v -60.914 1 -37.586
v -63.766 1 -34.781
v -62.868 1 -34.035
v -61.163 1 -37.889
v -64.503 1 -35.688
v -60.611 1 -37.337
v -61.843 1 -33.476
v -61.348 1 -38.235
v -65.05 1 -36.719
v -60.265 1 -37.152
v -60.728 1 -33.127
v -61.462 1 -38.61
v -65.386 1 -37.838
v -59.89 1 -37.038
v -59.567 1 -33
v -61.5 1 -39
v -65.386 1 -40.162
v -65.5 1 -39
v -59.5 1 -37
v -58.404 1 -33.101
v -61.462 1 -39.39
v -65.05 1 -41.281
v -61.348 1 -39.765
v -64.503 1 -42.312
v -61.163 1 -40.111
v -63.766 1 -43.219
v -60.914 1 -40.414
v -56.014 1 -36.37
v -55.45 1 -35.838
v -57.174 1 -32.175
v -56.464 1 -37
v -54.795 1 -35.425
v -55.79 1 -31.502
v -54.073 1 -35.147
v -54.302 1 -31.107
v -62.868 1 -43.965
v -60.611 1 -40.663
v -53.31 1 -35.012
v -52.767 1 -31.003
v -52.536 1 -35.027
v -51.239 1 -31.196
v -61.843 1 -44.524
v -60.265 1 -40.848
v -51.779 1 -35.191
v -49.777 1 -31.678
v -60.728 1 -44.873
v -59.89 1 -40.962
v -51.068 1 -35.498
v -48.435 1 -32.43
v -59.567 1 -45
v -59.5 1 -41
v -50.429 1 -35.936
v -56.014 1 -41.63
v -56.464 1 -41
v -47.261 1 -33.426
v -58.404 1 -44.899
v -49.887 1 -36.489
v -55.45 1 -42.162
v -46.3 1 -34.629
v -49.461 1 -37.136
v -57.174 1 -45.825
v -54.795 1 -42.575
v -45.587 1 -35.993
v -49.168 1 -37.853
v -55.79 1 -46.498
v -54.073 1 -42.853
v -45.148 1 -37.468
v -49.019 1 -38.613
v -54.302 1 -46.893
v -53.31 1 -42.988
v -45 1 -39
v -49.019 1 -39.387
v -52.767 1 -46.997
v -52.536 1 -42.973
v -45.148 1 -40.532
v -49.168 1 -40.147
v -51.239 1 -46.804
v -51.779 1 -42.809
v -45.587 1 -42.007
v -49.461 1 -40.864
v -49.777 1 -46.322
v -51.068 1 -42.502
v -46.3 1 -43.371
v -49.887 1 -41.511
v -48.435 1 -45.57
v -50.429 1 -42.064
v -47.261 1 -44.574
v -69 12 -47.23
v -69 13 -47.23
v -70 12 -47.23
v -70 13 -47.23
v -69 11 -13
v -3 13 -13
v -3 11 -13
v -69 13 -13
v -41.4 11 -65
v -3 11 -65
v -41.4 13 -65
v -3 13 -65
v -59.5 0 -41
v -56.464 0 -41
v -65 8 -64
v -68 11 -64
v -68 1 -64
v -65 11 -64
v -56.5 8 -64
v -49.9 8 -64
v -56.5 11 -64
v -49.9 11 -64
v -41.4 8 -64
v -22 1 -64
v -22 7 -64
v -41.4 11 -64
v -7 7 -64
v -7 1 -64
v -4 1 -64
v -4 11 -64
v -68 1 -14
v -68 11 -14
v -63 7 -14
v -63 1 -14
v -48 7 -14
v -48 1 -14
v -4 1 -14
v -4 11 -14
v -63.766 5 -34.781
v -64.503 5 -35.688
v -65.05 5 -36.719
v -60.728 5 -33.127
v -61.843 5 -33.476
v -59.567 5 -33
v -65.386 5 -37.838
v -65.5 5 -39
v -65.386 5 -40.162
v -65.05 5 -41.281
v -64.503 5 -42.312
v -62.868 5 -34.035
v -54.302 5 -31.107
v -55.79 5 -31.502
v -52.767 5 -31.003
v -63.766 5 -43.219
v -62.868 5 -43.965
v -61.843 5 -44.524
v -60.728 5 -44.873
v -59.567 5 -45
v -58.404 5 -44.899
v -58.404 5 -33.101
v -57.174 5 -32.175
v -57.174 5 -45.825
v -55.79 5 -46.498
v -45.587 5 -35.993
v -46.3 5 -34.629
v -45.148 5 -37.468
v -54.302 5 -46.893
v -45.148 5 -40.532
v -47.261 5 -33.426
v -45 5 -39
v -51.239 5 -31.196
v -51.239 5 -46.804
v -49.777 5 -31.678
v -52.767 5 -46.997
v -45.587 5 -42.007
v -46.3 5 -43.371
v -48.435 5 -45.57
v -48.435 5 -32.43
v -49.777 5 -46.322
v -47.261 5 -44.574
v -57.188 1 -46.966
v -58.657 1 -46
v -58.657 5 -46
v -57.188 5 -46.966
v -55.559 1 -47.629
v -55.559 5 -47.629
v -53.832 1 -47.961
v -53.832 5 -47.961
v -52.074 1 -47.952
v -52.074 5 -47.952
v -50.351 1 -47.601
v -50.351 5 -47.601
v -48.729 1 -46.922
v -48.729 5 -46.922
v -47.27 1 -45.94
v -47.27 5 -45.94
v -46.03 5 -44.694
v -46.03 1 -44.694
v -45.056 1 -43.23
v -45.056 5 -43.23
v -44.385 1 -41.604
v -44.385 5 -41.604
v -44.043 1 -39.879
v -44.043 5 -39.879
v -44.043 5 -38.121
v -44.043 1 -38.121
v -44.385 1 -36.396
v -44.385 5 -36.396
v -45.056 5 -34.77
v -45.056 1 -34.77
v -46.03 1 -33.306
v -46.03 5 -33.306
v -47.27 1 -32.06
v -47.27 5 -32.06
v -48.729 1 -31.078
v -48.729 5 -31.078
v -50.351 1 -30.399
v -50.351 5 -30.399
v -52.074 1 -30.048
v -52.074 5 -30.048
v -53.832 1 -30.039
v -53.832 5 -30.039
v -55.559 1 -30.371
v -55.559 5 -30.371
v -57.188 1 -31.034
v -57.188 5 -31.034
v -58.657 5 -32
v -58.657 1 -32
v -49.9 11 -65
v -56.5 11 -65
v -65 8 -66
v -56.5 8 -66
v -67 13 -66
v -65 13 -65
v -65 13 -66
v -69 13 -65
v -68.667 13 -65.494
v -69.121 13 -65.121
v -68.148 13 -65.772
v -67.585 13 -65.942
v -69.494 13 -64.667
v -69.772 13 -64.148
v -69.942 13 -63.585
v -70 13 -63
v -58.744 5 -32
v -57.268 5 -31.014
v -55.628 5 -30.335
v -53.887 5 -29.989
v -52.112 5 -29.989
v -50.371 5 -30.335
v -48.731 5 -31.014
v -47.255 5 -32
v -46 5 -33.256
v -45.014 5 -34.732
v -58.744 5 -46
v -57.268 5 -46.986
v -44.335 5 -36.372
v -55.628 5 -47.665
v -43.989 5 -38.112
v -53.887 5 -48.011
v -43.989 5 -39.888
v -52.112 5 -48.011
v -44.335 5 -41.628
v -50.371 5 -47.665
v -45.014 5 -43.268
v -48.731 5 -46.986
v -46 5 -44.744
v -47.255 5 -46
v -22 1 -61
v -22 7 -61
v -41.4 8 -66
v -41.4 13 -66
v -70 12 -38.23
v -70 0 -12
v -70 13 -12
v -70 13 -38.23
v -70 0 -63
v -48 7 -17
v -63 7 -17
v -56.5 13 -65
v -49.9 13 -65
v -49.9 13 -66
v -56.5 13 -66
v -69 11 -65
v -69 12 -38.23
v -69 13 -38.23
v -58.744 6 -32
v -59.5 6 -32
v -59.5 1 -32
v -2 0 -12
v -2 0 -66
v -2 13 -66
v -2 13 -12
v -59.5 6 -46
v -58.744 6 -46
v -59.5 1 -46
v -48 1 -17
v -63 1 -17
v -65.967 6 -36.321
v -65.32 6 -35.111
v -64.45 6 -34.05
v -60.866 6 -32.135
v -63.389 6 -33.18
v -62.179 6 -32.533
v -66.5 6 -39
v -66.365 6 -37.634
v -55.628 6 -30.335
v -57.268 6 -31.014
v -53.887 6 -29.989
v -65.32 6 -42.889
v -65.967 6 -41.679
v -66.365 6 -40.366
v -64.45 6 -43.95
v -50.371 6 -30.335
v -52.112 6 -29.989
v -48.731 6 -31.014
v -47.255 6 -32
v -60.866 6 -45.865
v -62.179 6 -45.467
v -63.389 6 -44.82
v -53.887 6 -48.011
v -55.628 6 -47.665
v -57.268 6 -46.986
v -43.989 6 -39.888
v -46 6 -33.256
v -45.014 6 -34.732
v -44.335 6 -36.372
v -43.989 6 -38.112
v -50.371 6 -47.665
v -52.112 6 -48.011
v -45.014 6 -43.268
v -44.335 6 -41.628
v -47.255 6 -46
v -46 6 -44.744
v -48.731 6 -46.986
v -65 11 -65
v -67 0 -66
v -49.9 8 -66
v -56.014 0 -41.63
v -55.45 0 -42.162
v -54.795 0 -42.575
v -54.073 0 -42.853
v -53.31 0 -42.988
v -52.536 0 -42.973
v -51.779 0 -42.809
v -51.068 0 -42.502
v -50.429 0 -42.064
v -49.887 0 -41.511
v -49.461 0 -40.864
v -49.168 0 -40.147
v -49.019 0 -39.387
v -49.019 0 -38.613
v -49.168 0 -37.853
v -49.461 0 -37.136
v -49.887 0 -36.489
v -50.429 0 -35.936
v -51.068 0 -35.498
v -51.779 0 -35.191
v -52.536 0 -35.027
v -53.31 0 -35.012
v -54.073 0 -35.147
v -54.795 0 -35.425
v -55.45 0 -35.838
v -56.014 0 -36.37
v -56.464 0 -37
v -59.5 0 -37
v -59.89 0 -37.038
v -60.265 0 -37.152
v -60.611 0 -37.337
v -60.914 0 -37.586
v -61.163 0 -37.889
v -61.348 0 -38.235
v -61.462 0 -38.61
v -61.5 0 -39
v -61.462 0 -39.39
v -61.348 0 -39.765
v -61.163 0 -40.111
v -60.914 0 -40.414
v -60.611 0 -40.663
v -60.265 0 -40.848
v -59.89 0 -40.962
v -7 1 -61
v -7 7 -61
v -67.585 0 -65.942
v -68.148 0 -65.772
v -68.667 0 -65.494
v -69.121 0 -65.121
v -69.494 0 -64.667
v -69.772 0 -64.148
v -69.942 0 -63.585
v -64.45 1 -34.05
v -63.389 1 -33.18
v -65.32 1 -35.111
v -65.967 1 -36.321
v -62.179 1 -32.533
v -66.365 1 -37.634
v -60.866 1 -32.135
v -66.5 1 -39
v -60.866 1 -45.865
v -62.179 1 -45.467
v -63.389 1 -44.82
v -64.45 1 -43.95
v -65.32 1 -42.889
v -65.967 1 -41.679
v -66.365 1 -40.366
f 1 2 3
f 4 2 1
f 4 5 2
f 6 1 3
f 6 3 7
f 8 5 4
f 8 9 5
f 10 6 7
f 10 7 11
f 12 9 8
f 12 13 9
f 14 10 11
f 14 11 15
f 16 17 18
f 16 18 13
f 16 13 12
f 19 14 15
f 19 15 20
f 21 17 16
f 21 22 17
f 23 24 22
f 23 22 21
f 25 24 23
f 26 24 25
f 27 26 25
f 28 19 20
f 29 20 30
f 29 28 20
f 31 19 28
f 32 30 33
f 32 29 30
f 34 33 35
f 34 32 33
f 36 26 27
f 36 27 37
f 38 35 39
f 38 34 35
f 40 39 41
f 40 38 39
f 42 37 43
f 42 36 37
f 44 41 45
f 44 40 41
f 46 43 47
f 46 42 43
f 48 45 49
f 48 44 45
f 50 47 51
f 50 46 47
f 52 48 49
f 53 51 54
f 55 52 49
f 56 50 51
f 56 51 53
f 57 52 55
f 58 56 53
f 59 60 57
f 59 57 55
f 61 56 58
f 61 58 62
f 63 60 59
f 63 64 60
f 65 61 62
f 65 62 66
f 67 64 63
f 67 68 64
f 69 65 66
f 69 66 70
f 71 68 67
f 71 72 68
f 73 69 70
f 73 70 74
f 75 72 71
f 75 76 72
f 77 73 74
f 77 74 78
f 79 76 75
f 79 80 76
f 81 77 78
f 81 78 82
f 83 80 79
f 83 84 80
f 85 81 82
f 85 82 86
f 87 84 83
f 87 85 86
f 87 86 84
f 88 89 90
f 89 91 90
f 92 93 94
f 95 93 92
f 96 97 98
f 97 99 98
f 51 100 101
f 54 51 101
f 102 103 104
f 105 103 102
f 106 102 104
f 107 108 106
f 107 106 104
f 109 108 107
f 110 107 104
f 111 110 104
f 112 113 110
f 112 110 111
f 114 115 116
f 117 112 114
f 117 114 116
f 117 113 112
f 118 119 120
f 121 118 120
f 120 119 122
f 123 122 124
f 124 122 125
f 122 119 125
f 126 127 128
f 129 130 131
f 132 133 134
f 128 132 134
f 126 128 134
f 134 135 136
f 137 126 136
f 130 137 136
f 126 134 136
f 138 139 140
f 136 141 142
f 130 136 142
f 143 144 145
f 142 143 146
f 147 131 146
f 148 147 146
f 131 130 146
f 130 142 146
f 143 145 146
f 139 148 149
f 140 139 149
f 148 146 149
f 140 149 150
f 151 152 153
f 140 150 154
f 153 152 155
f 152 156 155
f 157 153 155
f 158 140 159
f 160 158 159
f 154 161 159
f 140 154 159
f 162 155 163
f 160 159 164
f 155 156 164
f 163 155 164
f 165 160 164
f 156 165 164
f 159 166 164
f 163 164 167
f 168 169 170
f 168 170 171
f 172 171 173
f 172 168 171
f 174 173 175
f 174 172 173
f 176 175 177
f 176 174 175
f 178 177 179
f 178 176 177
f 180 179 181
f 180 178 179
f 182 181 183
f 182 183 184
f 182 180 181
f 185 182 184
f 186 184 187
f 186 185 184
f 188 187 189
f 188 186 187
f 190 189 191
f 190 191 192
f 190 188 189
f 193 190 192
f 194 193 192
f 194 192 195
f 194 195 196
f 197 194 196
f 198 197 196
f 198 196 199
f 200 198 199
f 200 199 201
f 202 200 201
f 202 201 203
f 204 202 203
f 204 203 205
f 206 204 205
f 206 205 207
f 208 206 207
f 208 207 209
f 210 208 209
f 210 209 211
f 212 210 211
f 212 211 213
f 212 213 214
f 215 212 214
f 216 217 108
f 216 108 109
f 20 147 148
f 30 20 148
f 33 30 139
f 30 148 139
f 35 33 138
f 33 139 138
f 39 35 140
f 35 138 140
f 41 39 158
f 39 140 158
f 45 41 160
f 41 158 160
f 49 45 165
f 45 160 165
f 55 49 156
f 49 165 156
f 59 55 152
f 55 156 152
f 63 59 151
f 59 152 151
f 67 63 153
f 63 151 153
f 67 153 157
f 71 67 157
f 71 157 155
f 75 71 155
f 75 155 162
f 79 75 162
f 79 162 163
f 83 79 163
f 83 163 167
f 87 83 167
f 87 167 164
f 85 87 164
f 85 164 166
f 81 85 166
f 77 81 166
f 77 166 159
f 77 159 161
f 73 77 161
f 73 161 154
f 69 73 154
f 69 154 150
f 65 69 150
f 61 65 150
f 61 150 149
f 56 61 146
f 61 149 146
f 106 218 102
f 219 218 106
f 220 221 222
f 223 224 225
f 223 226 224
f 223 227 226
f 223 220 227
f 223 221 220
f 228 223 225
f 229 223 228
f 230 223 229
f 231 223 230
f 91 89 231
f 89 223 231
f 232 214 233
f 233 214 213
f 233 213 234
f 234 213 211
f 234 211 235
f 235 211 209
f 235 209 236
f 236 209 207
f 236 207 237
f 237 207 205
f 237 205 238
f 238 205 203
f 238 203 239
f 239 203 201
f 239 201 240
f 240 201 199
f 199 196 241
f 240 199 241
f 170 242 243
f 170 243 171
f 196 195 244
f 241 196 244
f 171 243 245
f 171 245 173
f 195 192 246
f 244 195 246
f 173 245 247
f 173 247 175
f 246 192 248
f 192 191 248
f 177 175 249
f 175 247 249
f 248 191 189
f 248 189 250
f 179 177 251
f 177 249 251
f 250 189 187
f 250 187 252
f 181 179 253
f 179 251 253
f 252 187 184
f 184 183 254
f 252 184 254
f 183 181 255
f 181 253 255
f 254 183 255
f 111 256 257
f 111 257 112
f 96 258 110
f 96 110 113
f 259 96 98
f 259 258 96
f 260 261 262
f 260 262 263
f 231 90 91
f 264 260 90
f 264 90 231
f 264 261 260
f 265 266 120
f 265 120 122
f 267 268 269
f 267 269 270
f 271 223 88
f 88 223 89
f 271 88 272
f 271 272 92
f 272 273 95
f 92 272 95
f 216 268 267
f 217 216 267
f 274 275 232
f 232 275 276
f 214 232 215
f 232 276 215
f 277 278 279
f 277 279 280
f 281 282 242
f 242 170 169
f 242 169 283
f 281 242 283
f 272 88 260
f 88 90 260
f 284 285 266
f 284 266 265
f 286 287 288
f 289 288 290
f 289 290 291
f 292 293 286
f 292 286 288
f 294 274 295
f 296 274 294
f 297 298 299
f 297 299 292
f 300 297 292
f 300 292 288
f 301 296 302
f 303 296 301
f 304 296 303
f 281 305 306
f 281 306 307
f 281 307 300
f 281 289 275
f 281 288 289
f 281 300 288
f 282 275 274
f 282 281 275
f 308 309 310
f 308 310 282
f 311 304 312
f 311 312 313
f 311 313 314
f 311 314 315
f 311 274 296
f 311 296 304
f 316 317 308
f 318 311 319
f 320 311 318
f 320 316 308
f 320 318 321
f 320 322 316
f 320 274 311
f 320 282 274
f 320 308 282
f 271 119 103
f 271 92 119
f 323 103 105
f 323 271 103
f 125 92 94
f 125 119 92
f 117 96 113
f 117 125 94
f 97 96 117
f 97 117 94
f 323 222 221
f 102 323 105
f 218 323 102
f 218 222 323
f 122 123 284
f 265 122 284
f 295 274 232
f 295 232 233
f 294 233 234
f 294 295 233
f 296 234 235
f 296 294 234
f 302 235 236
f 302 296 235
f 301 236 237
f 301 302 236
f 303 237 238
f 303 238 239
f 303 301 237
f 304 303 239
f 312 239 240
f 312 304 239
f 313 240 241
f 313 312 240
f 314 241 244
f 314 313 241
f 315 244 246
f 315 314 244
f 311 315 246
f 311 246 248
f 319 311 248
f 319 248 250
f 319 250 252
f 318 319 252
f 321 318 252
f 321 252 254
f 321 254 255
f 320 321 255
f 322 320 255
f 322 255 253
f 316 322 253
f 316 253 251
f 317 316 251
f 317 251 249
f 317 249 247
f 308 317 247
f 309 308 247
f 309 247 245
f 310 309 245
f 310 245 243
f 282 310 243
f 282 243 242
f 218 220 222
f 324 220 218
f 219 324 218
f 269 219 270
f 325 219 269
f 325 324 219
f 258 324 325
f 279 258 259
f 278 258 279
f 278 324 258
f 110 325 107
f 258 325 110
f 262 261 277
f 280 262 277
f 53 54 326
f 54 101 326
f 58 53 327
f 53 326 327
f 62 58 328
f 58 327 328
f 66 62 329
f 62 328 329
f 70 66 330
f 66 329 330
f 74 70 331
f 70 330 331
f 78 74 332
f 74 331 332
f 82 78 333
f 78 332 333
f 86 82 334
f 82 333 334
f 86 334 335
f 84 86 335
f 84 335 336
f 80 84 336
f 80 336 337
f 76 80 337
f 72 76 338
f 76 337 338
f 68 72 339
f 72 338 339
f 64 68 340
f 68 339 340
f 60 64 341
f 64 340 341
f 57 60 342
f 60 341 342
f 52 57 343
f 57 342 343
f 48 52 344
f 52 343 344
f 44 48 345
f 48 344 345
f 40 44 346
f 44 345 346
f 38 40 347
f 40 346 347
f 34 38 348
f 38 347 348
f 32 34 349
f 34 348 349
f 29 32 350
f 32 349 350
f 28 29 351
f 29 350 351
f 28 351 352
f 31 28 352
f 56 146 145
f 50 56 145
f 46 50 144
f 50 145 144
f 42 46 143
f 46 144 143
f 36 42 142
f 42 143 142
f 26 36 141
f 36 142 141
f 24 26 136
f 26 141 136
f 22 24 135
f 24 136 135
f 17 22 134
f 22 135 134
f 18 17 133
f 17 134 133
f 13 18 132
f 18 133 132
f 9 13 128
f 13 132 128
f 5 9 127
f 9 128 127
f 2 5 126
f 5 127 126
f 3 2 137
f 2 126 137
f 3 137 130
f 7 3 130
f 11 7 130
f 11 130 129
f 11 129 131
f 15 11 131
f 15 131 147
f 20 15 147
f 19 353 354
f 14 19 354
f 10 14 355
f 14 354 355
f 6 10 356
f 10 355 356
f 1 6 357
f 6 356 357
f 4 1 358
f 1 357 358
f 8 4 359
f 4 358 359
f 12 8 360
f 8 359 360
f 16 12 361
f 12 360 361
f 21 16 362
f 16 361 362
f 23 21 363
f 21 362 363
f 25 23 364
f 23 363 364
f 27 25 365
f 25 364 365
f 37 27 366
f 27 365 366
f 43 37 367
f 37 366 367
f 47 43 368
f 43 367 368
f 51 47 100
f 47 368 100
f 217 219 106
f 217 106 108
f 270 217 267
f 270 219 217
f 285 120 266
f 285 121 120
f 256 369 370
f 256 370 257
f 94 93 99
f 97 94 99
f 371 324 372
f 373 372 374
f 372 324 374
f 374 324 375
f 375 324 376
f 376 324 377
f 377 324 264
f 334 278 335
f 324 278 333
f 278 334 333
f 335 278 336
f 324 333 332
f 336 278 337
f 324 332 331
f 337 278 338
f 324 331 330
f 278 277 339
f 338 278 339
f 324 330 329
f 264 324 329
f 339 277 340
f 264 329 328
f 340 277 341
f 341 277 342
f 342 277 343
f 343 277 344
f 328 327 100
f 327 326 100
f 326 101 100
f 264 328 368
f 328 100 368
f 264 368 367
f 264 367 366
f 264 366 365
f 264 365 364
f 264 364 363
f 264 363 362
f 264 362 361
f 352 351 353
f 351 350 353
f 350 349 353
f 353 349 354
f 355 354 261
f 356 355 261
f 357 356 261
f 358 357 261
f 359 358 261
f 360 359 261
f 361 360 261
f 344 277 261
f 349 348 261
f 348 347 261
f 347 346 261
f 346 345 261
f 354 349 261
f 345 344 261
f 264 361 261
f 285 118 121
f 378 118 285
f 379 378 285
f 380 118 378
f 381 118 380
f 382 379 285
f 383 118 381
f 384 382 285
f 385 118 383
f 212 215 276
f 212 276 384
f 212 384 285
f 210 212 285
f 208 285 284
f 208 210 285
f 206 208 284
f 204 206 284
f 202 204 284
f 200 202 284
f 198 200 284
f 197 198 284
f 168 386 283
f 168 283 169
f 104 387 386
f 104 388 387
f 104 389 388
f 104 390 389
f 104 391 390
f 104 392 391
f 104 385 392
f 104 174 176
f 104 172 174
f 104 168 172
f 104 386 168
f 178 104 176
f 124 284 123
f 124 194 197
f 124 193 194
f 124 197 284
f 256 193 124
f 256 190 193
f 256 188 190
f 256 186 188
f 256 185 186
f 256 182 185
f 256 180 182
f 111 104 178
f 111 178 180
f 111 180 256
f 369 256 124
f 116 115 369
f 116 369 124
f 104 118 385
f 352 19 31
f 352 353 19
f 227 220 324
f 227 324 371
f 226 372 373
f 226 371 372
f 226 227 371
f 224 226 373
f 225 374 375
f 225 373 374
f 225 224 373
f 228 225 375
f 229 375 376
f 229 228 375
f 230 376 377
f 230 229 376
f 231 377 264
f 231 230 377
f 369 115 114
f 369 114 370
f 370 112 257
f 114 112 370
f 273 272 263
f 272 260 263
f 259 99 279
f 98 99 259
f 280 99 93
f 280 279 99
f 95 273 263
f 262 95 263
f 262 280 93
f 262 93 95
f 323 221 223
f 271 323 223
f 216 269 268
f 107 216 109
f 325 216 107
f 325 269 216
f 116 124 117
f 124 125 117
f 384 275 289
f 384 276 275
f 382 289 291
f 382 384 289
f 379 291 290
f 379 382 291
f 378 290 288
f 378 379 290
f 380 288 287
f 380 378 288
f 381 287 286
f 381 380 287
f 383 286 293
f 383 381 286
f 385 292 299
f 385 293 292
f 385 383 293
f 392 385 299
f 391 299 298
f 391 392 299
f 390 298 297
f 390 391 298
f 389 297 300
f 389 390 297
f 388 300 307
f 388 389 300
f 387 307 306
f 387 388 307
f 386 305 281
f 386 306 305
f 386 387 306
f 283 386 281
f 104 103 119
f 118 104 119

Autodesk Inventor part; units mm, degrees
ref_plane "YZ Plane" through (0, 0, 0) normal (1, 0, 0) x (0, 1, 0)
ref_plane "XZ Plane" through (0, 0, 0) normal (0, 1, 0) x (-1, 0, 0)
ref_plane "XY Plane" through (0, 0, 0) normal (0, 0, 1) x (1, 0, 0)
sketch "Sketch1" plane through (0, 0, 0) normal (0, 1, 0) x (-1, 0, 0)
  point P0 (0, 0)
sketch "Sketch2" plane through (0, 0, 0) normal (0, 1, 0) x (-1, 0, 0)
  line L0 (70, -12) -> (70, -66)
  line L1 (70, -66) -> (2, -66)
  line L2 (70, -12) -> (2, -12)
  line L3 (2, -66) -> (2, -12)
  point P0 (0, 0)
  point P1 (2, 0)
  dimension "d151" = 68
  dimension "d152" = 54
extrude "Extrusion1" add sketch "Sketch2" along normal blind 13
sketch "Sketch3" plane through (0, 13, 0) normal (0, 1, 0) x (1, 0, 0)
  point P0 (0, 0)
sketch "Sketch4" plane through (0, 13, 0) normal (0, 1, 0) x (1, 0, 0)
  line L0 (-2, 66) -> (-70, 66) projected
  line L1 (-30.4814, 66) -> (-28.4814, 66)
  line L2 (-28.4814, 66) -> (-28.4814, 64)
  line L3 (-70, 66) -> (-70, 12) projected
  line L4 (-70, 37.8423) -> (-70, 39.8423)
  line L5 (-70, 39.8423) -> (-68, 39.8423)
  line L6 (-68, 64) -> (-68, 14)
  line L7 (-68, 64) -> (-4, 64)
  line L8 (-68, 14) -> (-4, 14)
  line L9 (-4, 14) -> (-4, 64)
  line L10 (-70, 12) -> (-2, 12) projected
  line L11 (-2, 12) -> (-2, 66) projected
  point P0 (-2, 64)
  point P1 (-68, 12)
  dimension "d6" = 2
  dimension "d8" = 2
  dimension "d102" = 2
  dimension "d104" = 2
  dimension "d153" = 2
  dimension "d154" = 2
extrude "Extrusion2" cut sketch "Sketch4" against normal blind 12 contours L7 L9 L8 L6
sketch "Sketch10" plane through (0, 1, 0) normal (0, 1, 0) x (1, 0, 0)
  line L0 (-48, 14) -> (-48, 17)
  line L1 (-48, 14) -> (-63, 14)
  line L2 (-63, 14) -> (-63, 17)
  line L3 (-63, 17) -> (-48, 17)
  line L4 (-48, 17) -> (-48, 14)
  line L5 (-22, 64) -> (-7, 64)
  line L6 (-7, 64) -> (-7, 61)
  line L7 (-7, 61) -> (-22, 61)
  line L8 (-22, 61) -> (-22, 64)
  line L9 (-68, 64) -> (-4, 64) projected
  line L10 (-63, 14) -> (-48, 14)
  line L11 (-4, 14) -> (-68, 14) projected
  point P0 (-68, 2)
  point P1 (-2, 64)
  dimension "d55" = 3
  dimension "d56" = 15
  dimension "d60" = 15
  dimension "d108" = 3
  dimension "d155" = 0
extrude "Extrusion5" add sketch "Sketch10" along normal blind 6
sketch "Sketch12" plane through (0, 0, 0) normal (0, -1, 0) x (1, 0, 0)
  line L0 (0, 0) -> (0, -66) projected
  line L1 (-2, -12) -> (-2, -66) projected
  line L2 (-2, -66) -> (-70, -66) projected
  line L3 (-2, -66) -> (-70, -66)
  line L4 (-36, -66) -> (-36, -12)
  line L5 (-70, -66) -> (-70, -12) projected
  line L6 (-70, -66) -> (-70, -12)
  line L7 (-70, -39) -> (-2, -39)
  line L8 (-36, -39) -> (-36, -66)
  line L9 (-70, -66) -> (-36, -66)
  arc A0 (-56.4641, -41) -> (-56.4641, -37) centre (-53, -39) ccw
  line L10 (-53, -39) -> (-59.5, -39)
  arc A1 (-59.5, -37) -> (-59.5, -41) centre (-59.5, -39) ccw
  line L11 (-59.5, -41) -> (-56.4641, -41)
  line L12 (-59.5, -37) -> (-56.4641, -37)
  dimension "d158" = 8
  dimension "d159" = 6.5
  dimension "d160" = 4
extrude "Extrusion7" cut sketch "Sketch12" against normal blind 6 contours A0 L11 A1 L7 | L7 A1 L12 A0
sketch "Sketch13" plane through (0, 13, 0) normal (0, 1, 0) x (1, 0, 0)
  line L0 (-70, 66) -> (-70, 12) projected
  line L1 (-69, 65) -> (-69, 13)
  line L2 (-2, 66) -> (-70, 66) projected
  line L3 (-68, 64) -> (-4, 64)
  line L4 (-2, 64) -> (-2, 12)
  line L5 (-68, 14) -> (-68, 64)
  line L6 (-4, 14) -> (-68, 14) projected
  line L7 (-68, 14) -> (-4, 14)
  line L8 (-7, 64) -> (-4, 64) projected
  line L9 (-4, 14) -> (-4, 64)
  line L10 (-70, 12) -> (-2, 12) projected
  line L11 (-68, 13) -> (-69, 13)
  line L12 (-68, 13) -> (-3, 13)
  line L13 (-2, 12) -> (-2, 66) projected
  line L14 (-4, 13) -> (-3, 13)
  line L15 (-3, 13) -> (-3, 64)
  line L16 (-3, 64) -> (-3, 65)
  line L17 (-3, 65) -> (-69, 65)
  dimension "d96" = 1
  dimension "d99" = 1
extrude "Extrusion8" cut sketch "Sketch13" against normal blind 2 contours L17 L16 L15 L12 L11 L1 | L3 L9 L6 L5
sketch "Sketch15" plane through (-70, 0, -66) normal (-1, 0, 0) x (0, 0, 1)
  line L0 (62.4242, 8) -> (52.7396, 8)
  line L1 (0, 0) -> (66, 0) projected
  line L2 (0, 13) -> (54, 13) projected
  line L3 (0, 0) -> (0, 13) projected
  line L4 (18.77, 12) -> (27.77, 12)
  line L5 (27.77, 12) -> (27.77, 17)
  line L6 (27.77, 17) -> (18.77, 17)
  line L7 (18.77, 17) -> (18.77, 12)
  point P0 (66, 14)
  dimension "d118" = 8
  dimension "d140" = 27.77
  dimension "d141" = 9
  dimension "d143" = 5
  dimension "d150" = 4
extrude "Extrusion9" cut sketch "Sketch15" against normal blind 10
sketch "Sketch16" plane through (-2, 0, -66) normal (0, 0, -1) x (-1, 0, 0)
  line L0 (39.4, 13) -> (47.9, 13)
  line L1 (47.9, 13) -> (47.9, 8)
  line L2 (47.9, 8) -> (39.4, 8)
  line L3 (39.4, 8) -> (39.4, 13)
  line L4 (54.5, 13) -> (63, 13)
  line L5 (63, 13) -> (63, 8)
  line L6 (63, 8) -> (54.5, 8)
  line L7 (54.5, 8) -> (54.5, 13)
  line L8 (20, 7) -> (5, 7) projected
  line L9 (68, 0) -> (68, 13) projected
  point P0 (-2, 0)
  dimension "d127" = 8.5
  dimension "d128" = 8.5
  dimension "d131" = 28.6
  dimension "d132" = 13.5
  dimension "d148" = 5
  dimension "d149" = 6
extrude "Extrusion10" cut sketch "Sketch16" against normal blind 10
fillet "Fillet8" radius 3 1 edges at (-70, 6.5, -66)
sketch "Sketch17" plane through (0, 1, 0) normal (0, 1, 0) x (1, 0, 0)
  line L0 (-58.6569, 46) -> (-59.5, 46)
  arc A0 (-59.5, 46) -> (-59.5, 32) centre (-59.5, 39) ccw
  line L1 (-59.5, 32) -> (-58.6569, 32)
  arc A1 (-58.6569, 32) -> (-58.6569, 46) centre (-53, 39) ccw
  line L2 (-58.2915, 45) -> (-59.5, 45)
  arc A2 (-59.5, 45) -> (-59.5, 33) centre (-59.5, 39) ccw
  line L3 (-59.5, 33) -> (-58.2915, 33)
  arc A3 (-58.2915, 33) -> (-58.2915, 45) centre (-53, 39) ccw
  point P0 (0, 0)
  dimension "d165" = 1
extrude "Extrusion11" add sketch "Sketch17" along normal blind 5 contours A1 L1 A0 L0 | A3 L3 A2 L2
sketch "Sketch18" plane through (0, 6, 0) normal (0, 1, 0) x (1, 0, 0)
  arc A0 (-56.4641, 37) -> (-56.4641, 41) centre (-53, 39) ccw projected
  arc A1 (-58.7115, 32.0445) -> (-58.7115, 45.9555) centre (-53, 39) ccw
  arc A2 (-59.5, 41) -> (-59.5, 37) centre (-59.5, 39) ccw projected
  arc A3 (-58.7115, 45.9555) -> (-58.7115, 32.0445) centre (-59.5, 39) ccw
  arc A4 (-58.4038, 33.101) -> (-58.4038, 44.899) centre (-53, 39) ccw
  arc A5 (-58.4038, 44.899) -> (-58.4038, 33.101) centre (-59.5, 39) ccw
  point P0 (0, 0)
  dimension "d166" = 1
extrude "Extrusion12" cut sketch "Sketch18" against normal blind 5 contours A5 A4
sketch "Sketch19" plane through (0, 6, 0) normal (0, 1, 0) x (1, 0, 0)
  arc A0 (-59.5, 41) -> (-59.5, 37) centre (-59.5, 39) ccw projected
  arc A1 (-58.788, 45.9637) -> (-58.788, 32.0363) centre (-59.5, 39) ccw
  arc A2 (-56.4641, 37) -> (-56.4641, 41) centre (-53, 39) ccw projected
  arc A3 (-58.788, 32.0363) -> (-58.788, 45.9637) centre (-53, 39) ccw
  point P0 (0, 0)
extrude "Extrusion13" add sketch "Sketch19" against normal blind 1
properties part number "Shell 5 bottom"
